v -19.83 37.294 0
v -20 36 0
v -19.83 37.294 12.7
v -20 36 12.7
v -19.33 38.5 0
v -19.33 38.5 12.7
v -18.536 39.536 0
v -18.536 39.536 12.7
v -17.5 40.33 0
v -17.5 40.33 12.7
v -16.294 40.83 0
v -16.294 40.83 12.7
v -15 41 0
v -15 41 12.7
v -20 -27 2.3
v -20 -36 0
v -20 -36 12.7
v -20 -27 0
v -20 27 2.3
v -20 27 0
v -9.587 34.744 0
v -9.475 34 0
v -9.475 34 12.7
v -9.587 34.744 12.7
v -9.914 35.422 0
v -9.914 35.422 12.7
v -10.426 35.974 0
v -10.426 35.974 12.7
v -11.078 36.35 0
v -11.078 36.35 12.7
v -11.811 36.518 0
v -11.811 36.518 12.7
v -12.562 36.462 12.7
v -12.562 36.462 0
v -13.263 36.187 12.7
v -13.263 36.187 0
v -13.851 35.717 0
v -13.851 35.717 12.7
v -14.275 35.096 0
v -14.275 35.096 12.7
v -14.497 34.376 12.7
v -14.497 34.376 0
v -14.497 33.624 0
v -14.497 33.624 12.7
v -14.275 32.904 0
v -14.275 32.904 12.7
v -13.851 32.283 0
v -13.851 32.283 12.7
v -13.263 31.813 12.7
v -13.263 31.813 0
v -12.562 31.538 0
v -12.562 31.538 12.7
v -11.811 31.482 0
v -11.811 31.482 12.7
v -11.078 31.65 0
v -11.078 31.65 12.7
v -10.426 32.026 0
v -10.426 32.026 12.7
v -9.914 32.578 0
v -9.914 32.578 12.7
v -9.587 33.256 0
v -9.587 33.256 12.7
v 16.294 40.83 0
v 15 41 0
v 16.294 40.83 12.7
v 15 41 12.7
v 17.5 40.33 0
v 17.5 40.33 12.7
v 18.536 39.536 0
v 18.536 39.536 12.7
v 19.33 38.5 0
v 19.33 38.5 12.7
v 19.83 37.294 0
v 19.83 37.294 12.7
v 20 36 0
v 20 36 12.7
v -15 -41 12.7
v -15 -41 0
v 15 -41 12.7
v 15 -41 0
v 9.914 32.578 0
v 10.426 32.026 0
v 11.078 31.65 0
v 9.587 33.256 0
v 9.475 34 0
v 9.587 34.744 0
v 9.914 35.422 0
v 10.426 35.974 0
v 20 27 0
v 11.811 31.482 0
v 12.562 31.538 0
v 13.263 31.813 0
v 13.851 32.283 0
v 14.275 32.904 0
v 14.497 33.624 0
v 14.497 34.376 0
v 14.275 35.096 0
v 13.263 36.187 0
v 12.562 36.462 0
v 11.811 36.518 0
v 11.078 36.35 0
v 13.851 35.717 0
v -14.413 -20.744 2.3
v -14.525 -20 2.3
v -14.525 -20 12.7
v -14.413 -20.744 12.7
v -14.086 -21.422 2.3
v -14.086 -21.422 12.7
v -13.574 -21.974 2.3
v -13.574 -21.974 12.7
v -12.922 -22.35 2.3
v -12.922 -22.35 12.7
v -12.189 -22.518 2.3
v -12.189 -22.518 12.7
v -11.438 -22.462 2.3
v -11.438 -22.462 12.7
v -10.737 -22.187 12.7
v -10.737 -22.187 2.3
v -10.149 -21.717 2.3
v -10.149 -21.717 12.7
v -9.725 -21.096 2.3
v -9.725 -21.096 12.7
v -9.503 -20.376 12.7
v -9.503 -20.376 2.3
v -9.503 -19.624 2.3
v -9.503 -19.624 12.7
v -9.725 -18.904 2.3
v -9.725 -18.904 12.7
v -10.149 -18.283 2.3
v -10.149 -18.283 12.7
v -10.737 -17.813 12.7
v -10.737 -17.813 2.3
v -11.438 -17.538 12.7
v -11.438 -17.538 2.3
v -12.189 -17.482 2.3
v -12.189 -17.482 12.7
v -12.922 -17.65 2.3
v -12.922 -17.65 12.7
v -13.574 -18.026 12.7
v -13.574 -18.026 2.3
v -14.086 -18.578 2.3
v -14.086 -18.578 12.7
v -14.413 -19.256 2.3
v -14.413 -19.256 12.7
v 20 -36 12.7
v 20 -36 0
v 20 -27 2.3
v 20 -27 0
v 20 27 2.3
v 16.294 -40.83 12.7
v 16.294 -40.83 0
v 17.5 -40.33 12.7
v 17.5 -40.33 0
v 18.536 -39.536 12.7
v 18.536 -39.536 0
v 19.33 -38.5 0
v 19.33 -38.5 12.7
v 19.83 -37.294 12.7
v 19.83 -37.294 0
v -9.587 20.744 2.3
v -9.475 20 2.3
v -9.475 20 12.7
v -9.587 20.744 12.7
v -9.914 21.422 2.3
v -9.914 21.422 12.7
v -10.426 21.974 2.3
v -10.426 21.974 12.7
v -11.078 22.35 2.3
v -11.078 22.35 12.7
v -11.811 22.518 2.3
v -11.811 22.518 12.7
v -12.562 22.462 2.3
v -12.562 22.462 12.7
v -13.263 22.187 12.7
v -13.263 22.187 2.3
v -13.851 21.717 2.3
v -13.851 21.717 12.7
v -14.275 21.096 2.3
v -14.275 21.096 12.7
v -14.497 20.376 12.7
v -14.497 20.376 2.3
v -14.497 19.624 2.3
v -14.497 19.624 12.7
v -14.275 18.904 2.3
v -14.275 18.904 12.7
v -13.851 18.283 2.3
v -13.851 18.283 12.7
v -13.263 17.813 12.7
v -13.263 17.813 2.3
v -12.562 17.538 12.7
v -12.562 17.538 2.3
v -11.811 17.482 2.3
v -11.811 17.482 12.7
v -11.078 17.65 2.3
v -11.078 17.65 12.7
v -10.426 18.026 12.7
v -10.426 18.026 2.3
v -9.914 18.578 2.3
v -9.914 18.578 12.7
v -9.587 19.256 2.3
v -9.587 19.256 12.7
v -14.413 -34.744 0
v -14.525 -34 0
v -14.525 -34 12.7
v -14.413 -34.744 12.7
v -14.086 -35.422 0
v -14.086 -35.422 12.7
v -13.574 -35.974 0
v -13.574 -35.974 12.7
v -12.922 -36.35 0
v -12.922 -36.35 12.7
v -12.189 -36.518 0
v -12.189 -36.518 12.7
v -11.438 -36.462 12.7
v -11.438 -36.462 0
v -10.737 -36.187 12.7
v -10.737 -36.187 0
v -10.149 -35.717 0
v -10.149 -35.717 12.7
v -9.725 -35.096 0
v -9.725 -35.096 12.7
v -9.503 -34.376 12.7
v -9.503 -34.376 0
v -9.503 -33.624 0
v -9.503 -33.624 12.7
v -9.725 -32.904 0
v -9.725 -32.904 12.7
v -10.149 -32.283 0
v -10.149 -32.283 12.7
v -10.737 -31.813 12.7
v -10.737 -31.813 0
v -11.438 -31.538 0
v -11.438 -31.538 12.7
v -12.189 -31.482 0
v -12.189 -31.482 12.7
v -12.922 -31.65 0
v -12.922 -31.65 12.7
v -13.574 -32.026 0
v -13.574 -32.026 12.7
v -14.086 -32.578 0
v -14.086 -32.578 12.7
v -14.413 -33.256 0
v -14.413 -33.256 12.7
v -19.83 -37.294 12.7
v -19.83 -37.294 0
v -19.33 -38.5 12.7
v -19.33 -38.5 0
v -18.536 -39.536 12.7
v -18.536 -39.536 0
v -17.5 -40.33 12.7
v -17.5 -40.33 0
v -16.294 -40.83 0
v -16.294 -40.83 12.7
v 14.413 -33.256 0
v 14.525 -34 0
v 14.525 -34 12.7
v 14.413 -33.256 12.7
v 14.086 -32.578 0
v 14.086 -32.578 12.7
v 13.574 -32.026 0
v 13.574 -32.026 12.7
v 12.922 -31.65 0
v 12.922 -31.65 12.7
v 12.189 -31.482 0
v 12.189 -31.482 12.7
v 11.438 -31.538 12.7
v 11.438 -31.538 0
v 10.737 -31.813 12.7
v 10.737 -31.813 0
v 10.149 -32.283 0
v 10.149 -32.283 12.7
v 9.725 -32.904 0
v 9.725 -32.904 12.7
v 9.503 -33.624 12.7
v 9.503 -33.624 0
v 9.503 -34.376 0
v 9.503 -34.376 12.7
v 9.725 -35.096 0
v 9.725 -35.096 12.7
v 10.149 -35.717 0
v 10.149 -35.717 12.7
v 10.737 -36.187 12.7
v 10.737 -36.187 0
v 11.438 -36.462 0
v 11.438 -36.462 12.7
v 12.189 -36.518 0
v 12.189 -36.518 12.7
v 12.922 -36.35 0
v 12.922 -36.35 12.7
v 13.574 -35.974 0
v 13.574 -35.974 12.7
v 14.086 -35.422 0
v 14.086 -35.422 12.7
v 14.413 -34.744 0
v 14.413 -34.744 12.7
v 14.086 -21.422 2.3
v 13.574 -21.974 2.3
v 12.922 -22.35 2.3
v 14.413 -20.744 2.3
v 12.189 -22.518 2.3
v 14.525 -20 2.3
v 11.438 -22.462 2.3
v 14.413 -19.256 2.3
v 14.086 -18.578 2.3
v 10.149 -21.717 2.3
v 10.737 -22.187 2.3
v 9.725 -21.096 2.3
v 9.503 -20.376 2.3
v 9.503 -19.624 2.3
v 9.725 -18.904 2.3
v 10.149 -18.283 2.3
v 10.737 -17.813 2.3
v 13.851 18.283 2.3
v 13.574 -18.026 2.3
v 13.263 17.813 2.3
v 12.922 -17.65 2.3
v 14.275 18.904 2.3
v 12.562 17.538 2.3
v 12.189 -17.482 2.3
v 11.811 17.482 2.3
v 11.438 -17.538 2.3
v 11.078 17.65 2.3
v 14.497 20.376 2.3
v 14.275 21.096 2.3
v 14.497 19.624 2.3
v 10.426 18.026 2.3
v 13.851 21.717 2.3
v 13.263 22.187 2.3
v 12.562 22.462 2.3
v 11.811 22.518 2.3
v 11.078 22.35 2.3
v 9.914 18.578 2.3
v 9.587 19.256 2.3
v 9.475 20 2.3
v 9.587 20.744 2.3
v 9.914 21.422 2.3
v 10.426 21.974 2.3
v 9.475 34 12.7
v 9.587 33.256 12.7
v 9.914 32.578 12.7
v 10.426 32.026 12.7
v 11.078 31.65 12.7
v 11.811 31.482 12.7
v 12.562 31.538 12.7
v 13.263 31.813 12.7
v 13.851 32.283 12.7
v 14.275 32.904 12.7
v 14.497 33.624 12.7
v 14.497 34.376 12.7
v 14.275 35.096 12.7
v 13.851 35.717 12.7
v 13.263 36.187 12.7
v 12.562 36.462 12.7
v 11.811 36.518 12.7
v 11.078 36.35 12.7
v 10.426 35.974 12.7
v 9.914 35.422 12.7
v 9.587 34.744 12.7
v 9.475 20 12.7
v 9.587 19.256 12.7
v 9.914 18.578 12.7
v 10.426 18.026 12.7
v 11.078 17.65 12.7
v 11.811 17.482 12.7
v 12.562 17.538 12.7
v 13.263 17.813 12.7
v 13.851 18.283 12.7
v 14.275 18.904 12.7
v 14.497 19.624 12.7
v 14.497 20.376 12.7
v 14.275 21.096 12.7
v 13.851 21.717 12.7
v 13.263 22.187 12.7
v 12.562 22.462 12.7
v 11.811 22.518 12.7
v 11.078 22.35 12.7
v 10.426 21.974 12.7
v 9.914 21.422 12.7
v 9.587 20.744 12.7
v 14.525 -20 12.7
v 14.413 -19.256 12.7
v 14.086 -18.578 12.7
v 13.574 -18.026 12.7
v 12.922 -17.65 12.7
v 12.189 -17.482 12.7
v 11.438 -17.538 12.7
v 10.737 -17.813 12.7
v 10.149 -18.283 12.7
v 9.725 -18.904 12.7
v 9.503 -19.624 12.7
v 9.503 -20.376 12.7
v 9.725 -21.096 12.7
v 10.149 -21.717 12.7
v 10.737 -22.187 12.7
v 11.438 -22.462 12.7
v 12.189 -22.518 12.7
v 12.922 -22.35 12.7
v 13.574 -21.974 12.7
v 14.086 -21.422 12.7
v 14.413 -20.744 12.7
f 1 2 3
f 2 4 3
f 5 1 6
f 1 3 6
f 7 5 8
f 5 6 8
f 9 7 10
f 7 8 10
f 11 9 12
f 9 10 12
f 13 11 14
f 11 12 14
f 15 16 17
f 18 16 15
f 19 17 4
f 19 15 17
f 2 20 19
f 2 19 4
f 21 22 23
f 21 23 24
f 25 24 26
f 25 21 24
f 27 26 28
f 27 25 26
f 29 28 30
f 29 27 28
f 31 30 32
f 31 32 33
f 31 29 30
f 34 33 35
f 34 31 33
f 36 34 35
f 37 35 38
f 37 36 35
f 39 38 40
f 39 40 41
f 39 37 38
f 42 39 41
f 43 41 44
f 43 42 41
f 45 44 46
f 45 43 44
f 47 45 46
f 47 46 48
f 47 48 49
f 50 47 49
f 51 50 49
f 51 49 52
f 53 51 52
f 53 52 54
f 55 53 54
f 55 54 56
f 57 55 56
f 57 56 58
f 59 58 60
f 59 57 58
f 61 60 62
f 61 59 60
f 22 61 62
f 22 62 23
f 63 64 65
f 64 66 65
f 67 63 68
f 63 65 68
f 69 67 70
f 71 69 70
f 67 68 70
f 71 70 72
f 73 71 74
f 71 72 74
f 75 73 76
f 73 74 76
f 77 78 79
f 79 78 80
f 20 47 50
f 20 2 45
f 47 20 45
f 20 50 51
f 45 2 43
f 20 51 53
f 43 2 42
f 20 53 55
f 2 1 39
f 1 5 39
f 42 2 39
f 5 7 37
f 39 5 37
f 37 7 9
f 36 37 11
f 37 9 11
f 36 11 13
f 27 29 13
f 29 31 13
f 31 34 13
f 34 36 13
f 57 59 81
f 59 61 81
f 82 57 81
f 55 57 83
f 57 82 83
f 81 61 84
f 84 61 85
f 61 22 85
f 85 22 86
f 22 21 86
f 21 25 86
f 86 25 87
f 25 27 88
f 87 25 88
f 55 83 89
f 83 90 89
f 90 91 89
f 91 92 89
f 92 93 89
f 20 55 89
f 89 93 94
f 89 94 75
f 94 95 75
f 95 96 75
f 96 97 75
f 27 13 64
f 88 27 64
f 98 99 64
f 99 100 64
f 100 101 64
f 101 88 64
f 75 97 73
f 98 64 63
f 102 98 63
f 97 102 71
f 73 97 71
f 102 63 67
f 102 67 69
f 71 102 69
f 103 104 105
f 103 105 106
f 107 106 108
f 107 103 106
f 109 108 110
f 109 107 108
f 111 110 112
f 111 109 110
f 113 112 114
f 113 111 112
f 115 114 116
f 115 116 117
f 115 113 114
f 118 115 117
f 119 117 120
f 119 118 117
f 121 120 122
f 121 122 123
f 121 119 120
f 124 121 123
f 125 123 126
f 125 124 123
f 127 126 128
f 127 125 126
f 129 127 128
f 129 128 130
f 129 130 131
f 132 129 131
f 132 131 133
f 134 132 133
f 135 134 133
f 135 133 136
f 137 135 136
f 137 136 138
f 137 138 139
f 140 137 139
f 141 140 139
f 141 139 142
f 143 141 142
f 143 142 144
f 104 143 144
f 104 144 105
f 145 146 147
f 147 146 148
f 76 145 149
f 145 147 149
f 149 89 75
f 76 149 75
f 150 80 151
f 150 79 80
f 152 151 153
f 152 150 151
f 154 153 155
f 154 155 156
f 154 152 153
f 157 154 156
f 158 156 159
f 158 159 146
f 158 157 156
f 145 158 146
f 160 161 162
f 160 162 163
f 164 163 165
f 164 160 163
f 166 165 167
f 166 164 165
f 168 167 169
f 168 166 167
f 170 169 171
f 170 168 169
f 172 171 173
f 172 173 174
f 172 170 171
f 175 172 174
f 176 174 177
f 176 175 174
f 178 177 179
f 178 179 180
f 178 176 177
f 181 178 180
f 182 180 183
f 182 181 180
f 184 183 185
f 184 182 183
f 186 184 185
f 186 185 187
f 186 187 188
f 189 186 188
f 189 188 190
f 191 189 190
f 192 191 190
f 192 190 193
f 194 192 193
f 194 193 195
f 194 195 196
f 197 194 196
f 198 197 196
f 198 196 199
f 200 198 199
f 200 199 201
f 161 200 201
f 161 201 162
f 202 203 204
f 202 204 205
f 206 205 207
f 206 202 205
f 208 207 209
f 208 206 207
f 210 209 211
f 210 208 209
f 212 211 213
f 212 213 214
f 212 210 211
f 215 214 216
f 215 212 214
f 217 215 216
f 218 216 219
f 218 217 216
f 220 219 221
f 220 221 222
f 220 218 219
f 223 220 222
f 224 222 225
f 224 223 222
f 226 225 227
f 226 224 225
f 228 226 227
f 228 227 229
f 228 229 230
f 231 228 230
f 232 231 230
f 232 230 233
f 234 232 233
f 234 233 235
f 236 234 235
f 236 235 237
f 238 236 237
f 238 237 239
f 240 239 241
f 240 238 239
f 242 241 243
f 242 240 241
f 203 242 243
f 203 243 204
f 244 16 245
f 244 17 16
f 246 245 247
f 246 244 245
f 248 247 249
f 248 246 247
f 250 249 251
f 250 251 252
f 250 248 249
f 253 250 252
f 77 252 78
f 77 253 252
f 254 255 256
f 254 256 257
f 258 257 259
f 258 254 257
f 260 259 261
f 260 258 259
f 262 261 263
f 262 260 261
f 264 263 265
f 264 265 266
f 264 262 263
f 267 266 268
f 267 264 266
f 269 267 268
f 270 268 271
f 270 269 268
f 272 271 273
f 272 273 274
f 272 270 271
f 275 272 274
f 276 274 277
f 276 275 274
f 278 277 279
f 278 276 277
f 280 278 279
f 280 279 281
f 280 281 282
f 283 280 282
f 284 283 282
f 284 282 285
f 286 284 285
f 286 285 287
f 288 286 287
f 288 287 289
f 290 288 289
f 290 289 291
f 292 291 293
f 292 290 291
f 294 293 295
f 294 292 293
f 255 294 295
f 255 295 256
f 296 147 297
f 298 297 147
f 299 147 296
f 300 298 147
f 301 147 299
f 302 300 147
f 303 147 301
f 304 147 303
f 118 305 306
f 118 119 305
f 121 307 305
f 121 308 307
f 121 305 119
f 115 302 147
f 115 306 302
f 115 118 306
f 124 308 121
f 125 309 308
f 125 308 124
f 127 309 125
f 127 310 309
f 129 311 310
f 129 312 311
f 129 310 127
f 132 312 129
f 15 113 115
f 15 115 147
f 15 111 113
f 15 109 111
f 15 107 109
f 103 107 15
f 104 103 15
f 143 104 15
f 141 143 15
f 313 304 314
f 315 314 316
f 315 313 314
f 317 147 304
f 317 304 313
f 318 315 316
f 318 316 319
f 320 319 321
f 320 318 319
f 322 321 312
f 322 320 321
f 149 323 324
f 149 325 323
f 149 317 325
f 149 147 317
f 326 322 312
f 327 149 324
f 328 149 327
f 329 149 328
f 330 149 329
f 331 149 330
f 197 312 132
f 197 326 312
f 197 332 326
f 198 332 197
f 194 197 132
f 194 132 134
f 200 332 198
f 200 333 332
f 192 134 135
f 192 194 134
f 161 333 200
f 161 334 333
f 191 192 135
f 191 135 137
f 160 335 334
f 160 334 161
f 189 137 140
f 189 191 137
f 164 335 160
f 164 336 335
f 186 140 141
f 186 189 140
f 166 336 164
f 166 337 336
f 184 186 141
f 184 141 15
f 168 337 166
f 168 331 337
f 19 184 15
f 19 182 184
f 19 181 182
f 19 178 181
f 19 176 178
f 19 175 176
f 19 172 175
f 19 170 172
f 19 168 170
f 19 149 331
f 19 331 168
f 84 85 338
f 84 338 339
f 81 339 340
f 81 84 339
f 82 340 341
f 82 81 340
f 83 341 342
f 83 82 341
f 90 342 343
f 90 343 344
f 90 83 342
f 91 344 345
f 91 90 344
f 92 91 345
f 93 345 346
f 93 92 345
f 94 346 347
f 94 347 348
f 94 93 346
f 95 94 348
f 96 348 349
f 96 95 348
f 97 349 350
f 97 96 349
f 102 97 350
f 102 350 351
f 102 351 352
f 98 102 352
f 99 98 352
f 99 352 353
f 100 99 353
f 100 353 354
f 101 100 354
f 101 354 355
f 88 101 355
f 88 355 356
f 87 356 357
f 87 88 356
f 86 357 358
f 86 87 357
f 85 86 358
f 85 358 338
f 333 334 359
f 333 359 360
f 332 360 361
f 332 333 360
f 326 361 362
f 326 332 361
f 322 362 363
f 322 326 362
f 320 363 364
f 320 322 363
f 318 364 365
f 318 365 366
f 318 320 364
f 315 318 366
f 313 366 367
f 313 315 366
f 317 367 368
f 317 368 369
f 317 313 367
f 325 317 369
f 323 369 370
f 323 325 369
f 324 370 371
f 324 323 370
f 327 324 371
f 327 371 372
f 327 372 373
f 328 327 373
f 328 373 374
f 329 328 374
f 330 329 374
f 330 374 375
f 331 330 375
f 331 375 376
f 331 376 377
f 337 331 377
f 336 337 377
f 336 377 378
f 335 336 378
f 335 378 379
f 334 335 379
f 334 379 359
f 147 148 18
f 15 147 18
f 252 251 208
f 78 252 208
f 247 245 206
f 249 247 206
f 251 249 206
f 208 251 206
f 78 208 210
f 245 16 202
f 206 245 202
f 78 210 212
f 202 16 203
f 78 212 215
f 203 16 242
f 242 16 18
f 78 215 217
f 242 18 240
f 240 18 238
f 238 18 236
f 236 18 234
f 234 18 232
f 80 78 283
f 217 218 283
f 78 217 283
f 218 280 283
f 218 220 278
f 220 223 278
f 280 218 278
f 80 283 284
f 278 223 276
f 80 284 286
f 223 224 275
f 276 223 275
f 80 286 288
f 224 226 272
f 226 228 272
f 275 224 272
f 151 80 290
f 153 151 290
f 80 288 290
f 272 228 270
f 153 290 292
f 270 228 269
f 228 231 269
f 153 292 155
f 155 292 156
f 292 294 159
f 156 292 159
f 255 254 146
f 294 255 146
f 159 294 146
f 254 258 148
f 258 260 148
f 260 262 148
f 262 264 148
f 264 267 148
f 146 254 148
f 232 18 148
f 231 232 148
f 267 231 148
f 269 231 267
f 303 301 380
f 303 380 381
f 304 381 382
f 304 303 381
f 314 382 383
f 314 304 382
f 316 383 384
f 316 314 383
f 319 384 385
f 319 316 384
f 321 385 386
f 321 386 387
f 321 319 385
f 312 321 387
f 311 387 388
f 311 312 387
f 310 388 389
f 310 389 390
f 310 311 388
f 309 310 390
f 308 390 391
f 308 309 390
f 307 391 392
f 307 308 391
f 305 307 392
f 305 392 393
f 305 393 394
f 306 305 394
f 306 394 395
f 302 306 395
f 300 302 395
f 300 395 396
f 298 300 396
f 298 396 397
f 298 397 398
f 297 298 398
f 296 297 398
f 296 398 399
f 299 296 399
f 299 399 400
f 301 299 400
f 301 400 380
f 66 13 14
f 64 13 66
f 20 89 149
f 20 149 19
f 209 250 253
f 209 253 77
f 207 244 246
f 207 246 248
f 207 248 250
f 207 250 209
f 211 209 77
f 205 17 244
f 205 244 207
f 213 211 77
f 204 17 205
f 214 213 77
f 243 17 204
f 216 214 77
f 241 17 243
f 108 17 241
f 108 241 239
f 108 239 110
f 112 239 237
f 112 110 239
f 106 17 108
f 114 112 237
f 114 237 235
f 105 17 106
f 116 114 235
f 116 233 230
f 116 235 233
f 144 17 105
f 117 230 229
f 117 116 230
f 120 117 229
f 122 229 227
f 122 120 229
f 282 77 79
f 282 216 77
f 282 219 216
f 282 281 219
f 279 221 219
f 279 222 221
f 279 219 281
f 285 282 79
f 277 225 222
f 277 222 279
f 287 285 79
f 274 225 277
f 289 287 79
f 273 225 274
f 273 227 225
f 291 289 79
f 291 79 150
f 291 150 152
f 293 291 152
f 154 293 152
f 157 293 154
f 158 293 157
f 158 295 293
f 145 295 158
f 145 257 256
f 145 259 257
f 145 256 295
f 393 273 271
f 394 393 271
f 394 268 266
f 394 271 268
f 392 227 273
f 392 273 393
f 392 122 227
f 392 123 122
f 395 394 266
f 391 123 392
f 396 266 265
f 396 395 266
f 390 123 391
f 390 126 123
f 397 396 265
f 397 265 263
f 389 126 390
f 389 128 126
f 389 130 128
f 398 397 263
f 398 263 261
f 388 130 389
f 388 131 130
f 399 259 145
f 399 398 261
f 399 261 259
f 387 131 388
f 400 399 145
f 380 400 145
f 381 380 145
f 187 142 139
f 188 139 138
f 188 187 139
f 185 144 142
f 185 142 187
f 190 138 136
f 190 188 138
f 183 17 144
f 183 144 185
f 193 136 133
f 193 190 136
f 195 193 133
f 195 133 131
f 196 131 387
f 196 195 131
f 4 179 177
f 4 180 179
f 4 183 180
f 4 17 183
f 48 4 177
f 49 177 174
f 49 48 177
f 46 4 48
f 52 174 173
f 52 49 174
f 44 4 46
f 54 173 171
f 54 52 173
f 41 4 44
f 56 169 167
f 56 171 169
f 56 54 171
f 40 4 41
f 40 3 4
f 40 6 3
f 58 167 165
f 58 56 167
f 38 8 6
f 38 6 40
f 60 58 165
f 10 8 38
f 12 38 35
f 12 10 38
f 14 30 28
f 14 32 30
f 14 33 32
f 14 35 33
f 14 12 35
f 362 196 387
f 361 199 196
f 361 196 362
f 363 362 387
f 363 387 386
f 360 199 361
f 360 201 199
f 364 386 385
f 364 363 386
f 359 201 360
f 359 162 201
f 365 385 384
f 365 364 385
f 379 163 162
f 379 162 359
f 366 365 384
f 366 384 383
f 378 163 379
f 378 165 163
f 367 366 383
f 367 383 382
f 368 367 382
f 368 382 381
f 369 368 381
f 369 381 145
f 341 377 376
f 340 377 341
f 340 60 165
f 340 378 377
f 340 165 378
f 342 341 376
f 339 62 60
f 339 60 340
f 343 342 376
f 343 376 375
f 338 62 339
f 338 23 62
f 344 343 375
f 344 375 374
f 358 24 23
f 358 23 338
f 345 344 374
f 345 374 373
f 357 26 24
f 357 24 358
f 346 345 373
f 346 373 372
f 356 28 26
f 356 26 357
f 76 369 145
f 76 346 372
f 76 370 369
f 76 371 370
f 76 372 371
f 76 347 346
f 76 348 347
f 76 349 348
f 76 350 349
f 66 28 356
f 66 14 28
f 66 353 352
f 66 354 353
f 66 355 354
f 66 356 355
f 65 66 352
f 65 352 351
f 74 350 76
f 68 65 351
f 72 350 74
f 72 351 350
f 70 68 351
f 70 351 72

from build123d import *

# Parameters (mm, degrees)
SKETCH1_W           = 40
SKETCH1_H           = 82
SKETCH1_R           = 2.525
BOSS_EXTRUDE1_DEPTH = 12.7
SKETCH2_W           = 40
SKETCH2_H           = 54
CUT_EXTRUDE1_DEPTH  = 2.3
FILLET1_R           = 5


with BuildPart() as part:
    # Sketch1 → Boss-Extrude1 (new body)
    with BuildSketch(Plane.XY):
        Rectangle(SKETCH1_W, SKETCH1_H)
        with Locations((-12, 20)):
            Circle(SKETCH1_R, mode=Mode.SUBTRACT)
        with Locations((-12, 34)):
            Circle(SKETCH1_R, mode=Mode.SUBTRACT)
        with Locations(Location((12, 34, 0), (0, 0, 180))):
            Circle(SKETCH1_R, mode=Mode.SUBTRACT)
        with Locations(Location((12, 20, 0), (0, 0, 180))):
            Circle(SKETCH1_R, mode=Mode.SUBTRACT)
        with Locations((12, -20)):
            Circle(SKETCH1_R, mode=Mode.SUBTRACT)
        with Locations((12, -34)):
            Circle(SKETCH1_R, mode=Mode.SUBTRACT)
        with Locations(Location((-12, -20, 0), (0, 0, 180))):
            Circle(SKETCH1_R, mode=Mode.SUBTRACT)
        with Locations(Location((-12, -34, 0), (0, 0, 180))):
            Circle(SKETCH1_R, mode=Mode.SUBTRACT)
    extrude(amount=BOSS_EXTRUDE1_DEPTH)

    # Sketch2 → Cut-Extrude1 (cut)
    with BuildSketch(Plane(origin=(0, 0, 0), x_dir=(-1, 0, 0), z_dir=(0, 0, -1))):
        Rectangle(SKETCH2_W, SKETCH2_H)
    extrude(amount=-CUT_EXTRUDE1_DEPTH, mode=Mode.SUBTRACT)

    # Fillet1
    fillet1_edges = [part.edges().sort_by_distance(p)[0] for p in [
        (20, -41, 6.35),
        (-20, -41, 6.35),
        (-20, 41, 6.35),
        (20, 41, 6.35),
    ]]
    fillet(fillet1_edges, radius=FILLET1_R)


solid = part.part
